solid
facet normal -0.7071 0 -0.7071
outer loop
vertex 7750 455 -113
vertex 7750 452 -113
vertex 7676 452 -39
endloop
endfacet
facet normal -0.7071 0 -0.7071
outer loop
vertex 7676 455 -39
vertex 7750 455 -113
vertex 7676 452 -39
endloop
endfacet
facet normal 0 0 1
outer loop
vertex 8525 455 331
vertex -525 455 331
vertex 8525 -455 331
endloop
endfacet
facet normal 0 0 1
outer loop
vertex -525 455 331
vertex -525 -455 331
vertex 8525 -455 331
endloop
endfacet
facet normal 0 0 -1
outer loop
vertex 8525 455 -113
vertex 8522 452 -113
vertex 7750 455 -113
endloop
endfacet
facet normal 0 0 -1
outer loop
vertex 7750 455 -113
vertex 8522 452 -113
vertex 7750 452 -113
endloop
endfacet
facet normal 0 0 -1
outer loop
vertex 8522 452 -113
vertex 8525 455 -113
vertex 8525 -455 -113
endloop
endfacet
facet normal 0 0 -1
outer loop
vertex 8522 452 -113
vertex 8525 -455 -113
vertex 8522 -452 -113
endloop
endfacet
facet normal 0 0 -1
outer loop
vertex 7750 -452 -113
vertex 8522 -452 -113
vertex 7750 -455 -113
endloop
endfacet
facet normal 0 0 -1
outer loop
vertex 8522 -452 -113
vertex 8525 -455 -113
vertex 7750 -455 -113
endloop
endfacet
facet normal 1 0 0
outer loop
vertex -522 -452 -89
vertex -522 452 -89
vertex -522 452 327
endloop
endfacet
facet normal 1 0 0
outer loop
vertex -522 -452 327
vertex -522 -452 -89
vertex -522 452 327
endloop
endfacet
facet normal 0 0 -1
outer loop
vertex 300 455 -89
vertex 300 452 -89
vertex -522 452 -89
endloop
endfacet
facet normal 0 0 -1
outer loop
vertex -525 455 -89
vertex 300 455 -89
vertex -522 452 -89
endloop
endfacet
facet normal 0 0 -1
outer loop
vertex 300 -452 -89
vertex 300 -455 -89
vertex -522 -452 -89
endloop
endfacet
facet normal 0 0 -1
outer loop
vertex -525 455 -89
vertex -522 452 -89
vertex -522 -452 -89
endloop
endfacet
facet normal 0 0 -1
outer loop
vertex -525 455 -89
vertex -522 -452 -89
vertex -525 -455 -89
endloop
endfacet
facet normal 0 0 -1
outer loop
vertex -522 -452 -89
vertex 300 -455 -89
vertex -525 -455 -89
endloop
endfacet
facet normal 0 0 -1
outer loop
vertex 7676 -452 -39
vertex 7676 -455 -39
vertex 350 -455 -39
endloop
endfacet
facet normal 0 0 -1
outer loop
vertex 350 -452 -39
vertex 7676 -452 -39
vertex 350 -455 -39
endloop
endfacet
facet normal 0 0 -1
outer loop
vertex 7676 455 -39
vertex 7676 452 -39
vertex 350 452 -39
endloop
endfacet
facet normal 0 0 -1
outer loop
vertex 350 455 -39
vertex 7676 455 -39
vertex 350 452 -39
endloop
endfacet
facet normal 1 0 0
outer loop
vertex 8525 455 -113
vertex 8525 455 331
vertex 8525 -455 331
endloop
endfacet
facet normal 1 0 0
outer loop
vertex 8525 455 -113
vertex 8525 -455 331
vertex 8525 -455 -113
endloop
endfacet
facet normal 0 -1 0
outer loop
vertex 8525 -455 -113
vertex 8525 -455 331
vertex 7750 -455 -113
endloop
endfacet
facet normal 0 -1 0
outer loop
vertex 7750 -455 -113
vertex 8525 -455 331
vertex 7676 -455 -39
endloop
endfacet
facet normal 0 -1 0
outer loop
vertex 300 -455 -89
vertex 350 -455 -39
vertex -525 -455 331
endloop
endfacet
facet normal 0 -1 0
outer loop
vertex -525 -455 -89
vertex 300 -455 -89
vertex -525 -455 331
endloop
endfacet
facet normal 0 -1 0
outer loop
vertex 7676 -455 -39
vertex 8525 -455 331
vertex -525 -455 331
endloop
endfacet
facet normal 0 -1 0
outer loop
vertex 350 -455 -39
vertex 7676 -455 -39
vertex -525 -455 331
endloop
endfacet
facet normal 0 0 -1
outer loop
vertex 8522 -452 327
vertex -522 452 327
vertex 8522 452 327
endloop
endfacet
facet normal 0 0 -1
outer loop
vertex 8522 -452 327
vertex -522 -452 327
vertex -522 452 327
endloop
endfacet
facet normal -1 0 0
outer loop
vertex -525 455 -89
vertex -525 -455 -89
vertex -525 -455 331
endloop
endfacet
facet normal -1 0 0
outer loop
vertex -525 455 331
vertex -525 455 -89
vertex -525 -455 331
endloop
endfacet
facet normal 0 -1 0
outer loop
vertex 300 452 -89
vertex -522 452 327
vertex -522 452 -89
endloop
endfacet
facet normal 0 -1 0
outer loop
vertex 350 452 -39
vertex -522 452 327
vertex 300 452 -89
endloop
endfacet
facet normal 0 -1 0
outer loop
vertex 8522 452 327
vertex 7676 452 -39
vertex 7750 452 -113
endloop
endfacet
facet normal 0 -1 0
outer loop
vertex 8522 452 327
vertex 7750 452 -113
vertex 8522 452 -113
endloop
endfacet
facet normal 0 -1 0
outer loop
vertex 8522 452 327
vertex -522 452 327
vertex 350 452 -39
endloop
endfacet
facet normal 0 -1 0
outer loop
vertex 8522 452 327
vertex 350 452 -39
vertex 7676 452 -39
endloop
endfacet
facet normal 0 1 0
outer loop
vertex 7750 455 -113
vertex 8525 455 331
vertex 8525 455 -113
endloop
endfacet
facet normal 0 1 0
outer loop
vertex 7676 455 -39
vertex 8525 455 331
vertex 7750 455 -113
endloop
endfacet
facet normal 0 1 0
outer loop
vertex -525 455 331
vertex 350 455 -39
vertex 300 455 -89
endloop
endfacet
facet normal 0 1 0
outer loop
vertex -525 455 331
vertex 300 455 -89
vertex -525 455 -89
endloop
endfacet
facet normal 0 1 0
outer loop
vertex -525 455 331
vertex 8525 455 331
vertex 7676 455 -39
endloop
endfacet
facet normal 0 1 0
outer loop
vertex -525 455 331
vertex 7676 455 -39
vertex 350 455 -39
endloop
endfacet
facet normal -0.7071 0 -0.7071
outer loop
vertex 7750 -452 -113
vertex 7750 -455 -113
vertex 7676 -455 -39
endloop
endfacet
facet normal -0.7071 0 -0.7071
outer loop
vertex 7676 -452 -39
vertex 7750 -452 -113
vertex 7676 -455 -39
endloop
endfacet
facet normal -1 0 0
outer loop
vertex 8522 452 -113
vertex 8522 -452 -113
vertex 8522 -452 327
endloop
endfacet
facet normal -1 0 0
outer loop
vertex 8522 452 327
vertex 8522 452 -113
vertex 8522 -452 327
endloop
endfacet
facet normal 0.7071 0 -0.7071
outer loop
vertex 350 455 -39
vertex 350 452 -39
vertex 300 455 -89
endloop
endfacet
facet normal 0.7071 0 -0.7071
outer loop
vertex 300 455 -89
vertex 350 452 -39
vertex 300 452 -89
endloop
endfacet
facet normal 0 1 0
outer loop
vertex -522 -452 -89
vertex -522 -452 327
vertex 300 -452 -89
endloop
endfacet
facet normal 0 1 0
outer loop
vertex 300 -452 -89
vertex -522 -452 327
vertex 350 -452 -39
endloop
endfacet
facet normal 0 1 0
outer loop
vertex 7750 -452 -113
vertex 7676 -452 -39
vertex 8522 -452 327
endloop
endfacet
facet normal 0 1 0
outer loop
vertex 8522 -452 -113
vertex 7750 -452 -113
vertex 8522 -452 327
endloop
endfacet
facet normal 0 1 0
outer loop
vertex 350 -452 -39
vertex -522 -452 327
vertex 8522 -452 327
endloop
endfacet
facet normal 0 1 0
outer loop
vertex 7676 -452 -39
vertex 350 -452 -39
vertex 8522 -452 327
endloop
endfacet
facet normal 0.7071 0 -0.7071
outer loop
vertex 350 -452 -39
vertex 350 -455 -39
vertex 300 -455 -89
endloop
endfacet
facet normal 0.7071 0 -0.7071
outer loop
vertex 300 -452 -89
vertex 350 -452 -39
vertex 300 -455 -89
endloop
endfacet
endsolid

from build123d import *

# Parameters (mm, degrees)
SKETCH030_W      = 9044
SKETCH030_H      = 550
EXTRUDE028_DEPTH = 452
EXTRUDE025_DEPTH = 455


with BuildPart() as extrude028:
    # Sketch030 → Extrude028 (new body, symmetric)
    with BuildSketch(Plane.XZ):
        with Locations((4000, 52)):
            Rectangle(SKETCH030_W, SKETCH030_H)
    extrude(amount=EXTRUDE028_DEPTH, both=True)


with BuildPart() as cut:
    # Sketch → Extrude025 (new body, symmetric)
    with BuildSketch(Plane.XZ):
        Polygon((-525, -89), (-525, 331), (8525, 331), (8525, -113), (7750, -113), (7676, -39), (350, -39), (300, -89), align=None)
    extrude(amount=EXTRUDE025_DEPTH, both=True)

    # Cut: cut Extrude028
    add(extrude028.part, mode=Mode.SUBTRACT)


solid = cut.part
